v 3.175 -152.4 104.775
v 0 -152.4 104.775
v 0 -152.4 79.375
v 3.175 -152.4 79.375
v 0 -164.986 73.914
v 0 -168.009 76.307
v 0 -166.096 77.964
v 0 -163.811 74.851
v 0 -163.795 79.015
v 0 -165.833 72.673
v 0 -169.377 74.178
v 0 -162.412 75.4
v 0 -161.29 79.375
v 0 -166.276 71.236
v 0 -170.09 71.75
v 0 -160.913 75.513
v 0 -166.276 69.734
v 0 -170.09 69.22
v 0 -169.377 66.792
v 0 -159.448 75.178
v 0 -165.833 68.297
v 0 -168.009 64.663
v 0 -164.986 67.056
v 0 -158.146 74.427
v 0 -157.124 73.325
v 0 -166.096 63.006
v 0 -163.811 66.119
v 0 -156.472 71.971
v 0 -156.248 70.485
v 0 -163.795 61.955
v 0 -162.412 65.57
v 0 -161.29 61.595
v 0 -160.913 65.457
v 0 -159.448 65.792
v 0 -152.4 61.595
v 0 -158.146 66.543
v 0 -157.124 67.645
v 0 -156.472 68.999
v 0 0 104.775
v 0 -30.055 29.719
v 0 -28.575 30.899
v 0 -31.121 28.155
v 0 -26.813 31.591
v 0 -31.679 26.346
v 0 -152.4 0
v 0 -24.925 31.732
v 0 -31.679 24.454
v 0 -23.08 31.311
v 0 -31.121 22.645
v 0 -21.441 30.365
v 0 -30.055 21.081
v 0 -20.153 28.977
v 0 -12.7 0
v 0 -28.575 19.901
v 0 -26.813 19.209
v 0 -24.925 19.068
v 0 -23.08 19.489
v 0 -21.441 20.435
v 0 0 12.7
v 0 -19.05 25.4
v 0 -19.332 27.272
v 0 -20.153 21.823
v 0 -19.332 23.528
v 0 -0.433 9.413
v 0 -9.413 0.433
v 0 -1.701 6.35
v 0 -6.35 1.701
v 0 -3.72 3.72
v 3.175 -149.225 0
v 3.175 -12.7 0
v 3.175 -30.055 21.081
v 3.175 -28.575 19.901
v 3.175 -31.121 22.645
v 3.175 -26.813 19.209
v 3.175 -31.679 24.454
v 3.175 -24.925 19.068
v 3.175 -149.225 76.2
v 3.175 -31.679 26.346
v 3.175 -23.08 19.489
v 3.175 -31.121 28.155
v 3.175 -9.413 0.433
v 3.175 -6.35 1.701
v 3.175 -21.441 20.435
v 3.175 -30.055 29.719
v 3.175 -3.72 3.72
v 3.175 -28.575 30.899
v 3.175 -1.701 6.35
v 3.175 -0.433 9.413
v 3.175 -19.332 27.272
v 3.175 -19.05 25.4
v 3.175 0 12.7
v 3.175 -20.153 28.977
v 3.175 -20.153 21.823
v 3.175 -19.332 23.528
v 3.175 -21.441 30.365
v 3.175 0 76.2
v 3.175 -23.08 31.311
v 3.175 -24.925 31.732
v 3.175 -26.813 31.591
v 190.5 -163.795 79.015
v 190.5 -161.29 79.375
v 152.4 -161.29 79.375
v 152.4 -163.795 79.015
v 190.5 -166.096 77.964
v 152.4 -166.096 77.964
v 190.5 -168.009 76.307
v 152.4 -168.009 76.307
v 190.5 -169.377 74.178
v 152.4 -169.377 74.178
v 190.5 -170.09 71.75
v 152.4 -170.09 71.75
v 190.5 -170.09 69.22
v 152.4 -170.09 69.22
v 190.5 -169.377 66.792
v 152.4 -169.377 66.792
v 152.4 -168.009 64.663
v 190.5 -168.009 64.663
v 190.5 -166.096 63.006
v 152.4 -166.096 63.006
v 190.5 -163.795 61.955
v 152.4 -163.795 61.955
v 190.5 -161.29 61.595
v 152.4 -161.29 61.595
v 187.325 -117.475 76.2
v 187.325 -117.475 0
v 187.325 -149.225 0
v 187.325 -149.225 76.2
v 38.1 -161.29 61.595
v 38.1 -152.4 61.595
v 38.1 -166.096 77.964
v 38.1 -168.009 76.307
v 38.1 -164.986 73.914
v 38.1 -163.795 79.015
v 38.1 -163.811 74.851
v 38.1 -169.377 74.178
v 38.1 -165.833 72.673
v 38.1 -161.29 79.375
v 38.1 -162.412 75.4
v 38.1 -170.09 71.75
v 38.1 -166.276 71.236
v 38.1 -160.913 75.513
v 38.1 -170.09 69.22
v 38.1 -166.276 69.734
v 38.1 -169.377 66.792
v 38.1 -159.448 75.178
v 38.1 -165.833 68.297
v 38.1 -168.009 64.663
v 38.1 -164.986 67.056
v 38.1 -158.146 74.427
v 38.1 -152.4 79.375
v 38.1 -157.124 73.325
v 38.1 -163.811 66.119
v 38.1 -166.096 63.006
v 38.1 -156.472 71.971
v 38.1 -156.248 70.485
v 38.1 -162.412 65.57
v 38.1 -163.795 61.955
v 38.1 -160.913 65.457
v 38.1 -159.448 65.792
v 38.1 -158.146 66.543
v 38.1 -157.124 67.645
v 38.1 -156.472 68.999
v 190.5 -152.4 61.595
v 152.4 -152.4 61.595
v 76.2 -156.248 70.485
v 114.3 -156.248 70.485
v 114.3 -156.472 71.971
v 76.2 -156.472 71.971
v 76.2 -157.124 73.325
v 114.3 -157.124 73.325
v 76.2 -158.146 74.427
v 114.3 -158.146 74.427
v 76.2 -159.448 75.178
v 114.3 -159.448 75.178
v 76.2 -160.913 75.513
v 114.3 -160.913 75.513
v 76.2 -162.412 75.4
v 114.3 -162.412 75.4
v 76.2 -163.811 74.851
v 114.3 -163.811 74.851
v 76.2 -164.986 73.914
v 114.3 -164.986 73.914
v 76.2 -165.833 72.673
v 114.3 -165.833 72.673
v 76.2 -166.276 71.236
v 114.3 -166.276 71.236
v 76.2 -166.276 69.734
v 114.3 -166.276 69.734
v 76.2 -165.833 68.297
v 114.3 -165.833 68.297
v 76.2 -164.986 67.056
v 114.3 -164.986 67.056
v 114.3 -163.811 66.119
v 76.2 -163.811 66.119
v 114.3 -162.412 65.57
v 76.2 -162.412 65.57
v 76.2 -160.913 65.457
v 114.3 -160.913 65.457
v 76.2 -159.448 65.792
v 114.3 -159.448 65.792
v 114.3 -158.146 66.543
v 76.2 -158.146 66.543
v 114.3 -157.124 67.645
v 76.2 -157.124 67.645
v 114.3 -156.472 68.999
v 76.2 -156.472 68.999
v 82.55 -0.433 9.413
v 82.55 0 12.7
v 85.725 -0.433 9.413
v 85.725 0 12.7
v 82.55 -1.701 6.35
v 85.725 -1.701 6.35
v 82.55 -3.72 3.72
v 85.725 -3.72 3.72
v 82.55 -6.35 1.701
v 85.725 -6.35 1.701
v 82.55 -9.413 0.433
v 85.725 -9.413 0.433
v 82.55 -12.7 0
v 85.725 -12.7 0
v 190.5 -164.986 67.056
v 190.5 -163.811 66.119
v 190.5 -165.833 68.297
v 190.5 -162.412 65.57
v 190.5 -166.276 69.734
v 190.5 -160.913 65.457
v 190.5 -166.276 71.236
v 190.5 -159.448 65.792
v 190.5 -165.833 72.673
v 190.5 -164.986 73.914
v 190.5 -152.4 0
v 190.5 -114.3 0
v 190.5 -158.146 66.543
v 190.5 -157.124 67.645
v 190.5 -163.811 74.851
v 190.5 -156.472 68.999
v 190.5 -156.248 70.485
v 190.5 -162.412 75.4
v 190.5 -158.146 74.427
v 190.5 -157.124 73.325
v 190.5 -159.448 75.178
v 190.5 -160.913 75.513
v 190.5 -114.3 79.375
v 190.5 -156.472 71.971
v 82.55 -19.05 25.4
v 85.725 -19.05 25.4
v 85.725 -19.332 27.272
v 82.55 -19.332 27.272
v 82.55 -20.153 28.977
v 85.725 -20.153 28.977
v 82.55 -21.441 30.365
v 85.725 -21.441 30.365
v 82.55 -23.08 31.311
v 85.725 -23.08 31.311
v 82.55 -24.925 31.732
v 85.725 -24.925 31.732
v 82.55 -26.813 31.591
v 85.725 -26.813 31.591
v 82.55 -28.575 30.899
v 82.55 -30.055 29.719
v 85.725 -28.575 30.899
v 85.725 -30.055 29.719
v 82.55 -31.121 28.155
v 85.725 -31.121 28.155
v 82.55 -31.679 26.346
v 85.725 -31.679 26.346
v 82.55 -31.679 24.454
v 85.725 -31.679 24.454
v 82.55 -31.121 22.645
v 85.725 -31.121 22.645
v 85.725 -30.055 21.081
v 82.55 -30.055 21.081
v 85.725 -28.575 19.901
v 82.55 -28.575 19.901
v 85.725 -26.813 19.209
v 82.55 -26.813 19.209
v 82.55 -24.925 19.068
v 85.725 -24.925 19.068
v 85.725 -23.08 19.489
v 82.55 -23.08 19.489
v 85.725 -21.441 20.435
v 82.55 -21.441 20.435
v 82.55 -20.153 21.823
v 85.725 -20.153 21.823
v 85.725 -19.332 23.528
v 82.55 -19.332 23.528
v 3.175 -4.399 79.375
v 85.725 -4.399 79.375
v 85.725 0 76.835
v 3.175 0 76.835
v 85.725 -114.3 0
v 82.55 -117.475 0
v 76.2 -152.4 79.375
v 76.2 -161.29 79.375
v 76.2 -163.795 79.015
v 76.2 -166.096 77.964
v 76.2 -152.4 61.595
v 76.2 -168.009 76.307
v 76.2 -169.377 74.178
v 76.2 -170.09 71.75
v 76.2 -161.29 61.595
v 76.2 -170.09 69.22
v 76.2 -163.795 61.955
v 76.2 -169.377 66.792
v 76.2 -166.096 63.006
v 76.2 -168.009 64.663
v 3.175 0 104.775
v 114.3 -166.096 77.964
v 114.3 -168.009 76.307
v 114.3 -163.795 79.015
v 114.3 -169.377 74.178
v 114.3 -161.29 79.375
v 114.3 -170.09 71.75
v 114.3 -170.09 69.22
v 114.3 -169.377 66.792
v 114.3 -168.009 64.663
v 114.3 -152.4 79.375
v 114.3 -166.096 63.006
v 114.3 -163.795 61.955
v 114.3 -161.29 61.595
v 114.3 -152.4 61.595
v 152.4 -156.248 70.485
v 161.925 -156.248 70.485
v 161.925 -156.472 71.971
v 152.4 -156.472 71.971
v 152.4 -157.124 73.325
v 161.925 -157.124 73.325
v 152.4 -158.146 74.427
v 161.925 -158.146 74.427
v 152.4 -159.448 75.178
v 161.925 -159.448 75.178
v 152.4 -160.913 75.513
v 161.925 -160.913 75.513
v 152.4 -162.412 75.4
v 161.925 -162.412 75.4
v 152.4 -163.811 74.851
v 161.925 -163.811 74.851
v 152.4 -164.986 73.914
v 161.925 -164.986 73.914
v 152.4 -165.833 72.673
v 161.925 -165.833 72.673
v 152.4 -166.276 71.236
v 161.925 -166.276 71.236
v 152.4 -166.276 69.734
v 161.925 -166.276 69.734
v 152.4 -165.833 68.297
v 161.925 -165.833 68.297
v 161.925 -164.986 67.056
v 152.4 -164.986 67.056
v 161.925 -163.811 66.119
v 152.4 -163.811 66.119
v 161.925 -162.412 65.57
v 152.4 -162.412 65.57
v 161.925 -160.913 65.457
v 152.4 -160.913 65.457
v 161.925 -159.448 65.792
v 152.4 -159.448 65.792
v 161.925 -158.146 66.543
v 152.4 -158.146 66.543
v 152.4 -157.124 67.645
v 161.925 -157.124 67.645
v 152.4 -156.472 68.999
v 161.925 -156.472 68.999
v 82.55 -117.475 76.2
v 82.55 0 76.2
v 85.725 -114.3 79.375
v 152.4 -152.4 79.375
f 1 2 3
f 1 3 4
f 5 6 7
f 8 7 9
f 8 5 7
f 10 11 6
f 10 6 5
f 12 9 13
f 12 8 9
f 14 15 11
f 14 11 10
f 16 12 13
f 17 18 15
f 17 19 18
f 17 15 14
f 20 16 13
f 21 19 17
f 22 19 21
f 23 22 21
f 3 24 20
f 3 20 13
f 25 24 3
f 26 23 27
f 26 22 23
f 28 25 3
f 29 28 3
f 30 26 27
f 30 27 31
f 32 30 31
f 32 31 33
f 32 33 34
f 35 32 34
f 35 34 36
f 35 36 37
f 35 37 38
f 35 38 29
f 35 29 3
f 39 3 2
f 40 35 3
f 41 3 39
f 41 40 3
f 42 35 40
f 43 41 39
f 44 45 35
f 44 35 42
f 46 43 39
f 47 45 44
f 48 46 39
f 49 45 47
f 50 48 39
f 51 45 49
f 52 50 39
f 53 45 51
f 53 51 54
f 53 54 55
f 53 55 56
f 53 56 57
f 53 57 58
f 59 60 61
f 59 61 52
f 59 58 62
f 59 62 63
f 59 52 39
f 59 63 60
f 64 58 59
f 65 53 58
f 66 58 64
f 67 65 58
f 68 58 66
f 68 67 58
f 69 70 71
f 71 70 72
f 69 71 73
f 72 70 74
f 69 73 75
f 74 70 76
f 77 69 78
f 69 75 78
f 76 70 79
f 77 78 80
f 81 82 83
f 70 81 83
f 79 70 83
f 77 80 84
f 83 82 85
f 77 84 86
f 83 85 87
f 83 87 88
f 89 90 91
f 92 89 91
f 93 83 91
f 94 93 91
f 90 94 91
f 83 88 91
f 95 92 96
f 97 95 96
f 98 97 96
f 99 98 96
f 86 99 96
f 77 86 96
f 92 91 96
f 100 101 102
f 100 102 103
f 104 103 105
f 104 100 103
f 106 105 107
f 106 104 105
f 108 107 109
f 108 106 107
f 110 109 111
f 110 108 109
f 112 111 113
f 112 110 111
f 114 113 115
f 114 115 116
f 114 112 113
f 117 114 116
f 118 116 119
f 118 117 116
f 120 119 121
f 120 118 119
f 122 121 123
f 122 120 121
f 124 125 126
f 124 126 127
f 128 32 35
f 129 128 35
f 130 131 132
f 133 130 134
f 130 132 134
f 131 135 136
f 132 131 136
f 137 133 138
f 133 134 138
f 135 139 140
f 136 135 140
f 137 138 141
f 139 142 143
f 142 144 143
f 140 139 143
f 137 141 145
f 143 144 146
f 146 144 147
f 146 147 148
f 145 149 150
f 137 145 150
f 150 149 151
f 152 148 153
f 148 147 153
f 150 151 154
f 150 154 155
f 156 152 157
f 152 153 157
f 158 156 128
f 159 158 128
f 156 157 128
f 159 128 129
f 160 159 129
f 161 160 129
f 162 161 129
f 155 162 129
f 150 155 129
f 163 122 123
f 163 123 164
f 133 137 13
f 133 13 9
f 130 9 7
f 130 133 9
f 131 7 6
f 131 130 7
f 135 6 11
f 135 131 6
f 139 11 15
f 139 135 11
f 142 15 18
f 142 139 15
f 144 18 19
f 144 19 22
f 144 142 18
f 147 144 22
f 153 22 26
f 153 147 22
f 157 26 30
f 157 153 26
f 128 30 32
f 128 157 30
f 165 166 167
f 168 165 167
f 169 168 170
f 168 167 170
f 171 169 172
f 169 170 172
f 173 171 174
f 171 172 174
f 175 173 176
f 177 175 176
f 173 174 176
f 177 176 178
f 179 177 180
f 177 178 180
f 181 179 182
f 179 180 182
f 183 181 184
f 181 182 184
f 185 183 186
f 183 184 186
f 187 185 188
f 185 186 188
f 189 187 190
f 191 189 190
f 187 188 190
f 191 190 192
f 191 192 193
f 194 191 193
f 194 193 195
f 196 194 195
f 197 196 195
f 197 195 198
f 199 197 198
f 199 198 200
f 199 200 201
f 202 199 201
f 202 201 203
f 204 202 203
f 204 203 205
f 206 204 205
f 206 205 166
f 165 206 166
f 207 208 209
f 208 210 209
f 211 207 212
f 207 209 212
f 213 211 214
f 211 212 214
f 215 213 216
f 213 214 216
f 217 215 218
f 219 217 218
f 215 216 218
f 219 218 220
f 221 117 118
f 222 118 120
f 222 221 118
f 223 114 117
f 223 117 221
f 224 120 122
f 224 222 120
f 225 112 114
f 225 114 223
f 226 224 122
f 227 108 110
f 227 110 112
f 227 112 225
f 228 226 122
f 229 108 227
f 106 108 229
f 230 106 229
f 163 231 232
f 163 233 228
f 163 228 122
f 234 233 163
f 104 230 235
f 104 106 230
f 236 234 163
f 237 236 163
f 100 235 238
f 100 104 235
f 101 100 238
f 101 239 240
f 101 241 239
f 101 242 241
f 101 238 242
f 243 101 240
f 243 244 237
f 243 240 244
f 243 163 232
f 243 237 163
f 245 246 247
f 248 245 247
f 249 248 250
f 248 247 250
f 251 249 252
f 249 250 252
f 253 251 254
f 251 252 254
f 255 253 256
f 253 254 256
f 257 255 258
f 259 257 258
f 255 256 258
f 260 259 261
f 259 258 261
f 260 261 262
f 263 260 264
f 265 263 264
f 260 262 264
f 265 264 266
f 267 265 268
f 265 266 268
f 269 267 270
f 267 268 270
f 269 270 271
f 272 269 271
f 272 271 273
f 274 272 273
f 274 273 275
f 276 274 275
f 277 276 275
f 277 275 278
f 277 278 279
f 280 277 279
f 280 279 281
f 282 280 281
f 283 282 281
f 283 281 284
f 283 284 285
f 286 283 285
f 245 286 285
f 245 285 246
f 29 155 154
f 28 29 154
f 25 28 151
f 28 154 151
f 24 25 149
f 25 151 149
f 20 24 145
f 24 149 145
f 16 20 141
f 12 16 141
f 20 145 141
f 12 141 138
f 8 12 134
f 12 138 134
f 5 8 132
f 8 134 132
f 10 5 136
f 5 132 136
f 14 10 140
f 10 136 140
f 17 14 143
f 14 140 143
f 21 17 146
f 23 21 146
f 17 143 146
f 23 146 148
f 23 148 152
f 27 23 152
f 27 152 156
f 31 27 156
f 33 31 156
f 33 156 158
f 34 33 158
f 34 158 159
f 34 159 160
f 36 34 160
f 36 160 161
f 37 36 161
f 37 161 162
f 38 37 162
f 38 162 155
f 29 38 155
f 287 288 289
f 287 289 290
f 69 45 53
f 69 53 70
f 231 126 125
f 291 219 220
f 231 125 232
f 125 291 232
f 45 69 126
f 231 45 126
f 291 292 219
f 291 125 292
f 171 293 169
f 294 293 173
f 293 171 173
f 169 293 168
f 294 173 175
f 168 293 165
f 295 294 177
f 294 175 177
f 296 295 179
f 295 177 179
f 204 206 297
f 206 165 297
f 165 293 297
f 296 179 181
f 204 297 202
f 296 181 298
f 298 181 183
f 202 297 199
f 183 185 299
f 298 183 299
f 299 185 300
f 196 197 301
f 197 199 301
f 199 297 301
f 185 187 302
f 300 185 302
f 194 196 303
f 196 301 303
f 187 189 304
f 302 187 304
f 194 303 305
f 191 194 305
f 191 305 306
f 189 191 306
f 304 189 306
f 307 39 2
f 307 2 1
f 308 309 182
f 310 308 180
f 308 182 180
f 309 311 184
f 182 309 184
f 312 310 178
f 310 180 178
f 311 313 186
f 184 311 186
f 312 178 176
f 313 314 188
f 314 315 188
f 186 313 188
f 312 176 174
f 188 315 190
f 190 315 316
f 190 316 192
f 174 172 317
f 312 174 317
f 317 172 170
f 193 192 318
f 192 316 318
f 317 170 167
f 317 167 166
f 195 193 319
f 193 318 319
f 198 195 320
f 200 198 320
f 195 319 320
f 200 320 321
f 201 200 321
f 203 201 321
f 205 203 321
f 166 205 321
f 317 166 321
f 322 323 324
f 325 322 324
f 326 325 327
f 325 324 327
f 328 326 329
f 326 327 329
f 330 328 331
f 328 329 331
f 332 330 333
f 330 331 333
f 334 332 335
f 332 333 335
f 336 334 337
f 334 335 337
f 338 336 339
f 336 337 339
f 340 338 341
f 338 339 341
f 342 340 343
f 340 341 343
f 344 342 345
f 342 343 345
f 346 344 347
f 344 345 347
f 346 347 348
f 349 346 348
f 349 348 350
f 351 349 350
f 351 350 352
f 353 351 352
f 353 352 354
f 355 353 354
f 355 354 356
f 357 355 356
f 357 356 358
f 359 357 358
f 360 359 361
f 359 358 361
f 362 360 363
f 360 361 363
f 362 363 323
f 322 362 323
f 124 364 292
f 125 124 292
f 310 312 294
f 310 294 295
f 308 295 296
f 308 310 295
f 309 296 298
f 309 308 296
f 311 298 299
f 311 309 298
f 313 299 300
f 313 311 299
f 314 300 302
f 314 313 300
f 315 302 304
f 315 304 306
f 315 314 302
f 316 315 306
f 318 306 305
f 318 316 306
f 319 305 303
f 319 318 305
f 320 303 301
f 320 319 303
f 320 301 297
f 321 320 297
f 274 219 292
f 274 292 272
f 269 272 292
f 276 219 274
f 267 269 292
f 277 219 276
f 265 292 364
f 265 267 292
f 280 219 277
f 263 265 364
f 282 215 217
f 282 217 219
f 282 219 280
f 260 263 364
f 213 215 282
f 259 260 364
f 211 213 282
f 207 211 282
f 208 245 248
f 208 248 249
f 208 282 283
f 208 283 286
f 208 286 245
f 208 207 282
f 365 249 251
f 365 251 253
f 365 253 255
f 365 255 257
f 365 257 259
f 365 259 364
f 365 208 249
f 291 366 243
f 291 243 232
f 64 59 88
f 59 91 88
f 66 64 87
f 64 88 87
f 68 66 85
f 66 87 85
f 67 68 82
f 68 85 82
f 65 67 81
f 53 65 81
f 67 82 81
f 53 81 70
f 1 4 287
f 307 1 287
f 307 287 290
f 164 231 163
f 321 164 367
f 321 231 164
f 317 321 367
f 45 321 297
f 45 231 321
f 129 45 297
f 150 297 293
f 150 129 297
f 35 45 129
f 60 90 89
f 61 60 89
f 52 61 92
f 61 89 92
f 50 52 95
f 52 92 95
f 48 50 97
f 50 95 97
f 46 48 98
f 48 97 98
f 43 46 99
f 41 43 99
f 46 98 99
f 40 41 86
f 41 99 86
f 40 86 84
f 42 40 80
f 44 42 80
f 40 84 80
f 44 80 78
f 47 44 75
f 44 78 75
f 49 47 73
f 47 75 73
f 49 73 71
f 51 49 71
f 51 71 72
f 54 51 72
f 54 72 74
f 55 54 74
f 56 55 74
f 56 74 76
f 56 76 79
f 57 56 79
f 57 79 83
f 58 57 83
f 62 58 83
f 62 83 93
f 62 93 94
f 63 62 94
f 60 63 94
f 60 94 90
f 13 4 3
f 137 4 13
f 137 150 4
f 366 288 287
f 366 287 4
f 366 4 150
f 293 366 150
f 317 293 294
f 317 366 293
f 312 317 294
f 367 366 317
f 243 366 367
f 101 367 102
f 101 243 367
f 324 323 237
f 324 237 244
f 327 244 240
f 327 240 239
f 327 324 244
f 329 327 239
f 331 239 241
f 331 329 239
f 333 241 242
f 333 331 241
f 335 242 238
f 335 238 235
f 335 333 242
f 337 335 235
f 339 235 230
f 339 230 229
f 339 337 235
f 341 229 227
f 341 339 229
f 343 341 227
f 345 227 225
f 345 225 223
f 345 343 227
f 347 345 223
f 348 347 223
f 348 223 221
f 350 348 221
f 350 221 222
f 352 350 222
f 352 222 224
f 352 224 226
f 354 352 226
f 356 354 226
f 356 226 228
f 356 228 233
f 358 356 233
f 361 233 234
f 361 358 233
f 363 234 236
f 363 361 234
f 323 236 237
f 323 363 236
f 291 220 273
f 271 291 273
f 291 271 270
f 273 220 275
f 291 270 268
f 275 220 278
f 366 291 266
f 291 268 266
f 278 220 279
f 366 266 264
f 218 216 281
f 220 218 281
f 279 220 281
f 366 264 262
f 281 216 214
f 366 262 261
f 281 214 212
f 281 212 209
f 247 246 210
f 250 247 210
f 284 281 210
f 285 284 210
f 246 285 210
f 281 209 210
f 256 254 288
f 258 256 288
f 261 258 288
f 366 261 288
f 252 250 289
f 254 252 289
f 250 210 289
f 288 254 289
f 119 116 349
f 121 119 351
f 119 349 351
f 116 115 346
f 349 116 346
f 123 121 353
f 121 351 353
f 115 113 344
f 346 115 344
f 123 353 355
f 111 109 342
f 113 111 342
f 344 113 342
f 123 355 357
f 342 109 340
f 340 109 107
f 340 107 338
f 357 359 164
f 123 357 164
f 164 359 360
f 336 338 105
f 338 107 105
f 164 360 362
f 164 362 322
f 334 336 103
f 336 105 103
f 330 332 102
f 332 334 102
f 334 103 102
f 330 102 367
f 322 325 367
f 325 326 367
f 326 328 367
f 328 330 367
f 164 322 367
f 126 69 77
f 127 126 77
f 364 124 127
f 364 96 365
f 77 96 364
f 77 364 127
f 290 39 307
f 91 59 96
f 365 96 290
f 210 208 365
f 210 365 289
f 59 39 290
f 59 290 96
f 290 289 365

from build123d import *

# Parameters (mm, degrees)
F0_W      = 3.175
F0_H      = 76.2
F0_H_2    = 3.175
F0_W_2    = 79.375
F1_DEPTH  = 152.4
F2_W      = 3.175
F2_H      = 76.2
F2_H_2    = 3.175
F2_W_2    = 31.75
F3_DEPTH  = 76.2
F4_W      = 3.175
F4_H      = 76.2
F5_DEPTH  = 79.375
F6_W      = 3.175
F6_H      = 76.2
F7_DEPTH  = 31.75
F8_R      = 5.0419
F9_DEPTH  = 161.925
F11_DEPTH = 17.781
F12_DEPTH = 61.596
F13_W     = 3.175
F13_H     = 152.4
F14_DEPTH = 25.4
F15_DEPTH = 25.4
F16_R     = 6.35
F17_DEPTH = 85.726
F18_R     = 12.7
F19_SIZE2 = 4.3994090512
F19_SIZE  = 2.54
F20_DEPTH = 38.1
F21_W     = 3.175
F21_H     = 76.2
F22_DEPTH = 31.75
F23_DEPTH = 28.575
F24_DEPTH = 9.525


with BuildPart() as f1:
    # F0 (on Front) → F1 (new body)
    with BuildSketch(Plane.XZ):
        with Locations((1.5875, 38.1)):
            Rectangle(F0_W, F0_H)
        with Locations((1.5875, 77.7875)):
            Rectangle(F0_W, F0_H_2)
        with Locations((42.8625, 77.7875)):
            Rectangle(F0_W_2, F0_H_2)
        with Locations((84.1375, 77.7875)):
            Rectangle(F0_W, F0_H_2)
        with Locations((84.1375, 38.1)):
            Rectangle(F0_W, F0_H)
    extrude(amount=F1_DEPTH)

    # F2 (on face) → F3 (join)
    with BuildSketch(Plane.YZ.offset(85.725)):
        with Locations((-150.8125, 38.1)):
            Rectangle(F2_W, F2_H)
        with Locations((-150.8125, 77.7875)):
            Rectangle(F2_W, F2_H_2)
        with Locations((-133.35, 77.7875)):
            Rectangle(F2_W_2, F2_H_2)
        with Locations((-115.8875, 38.1)):
            Rectangle(F2_W, F2_H)
        with Locations((-115.8875, 77.7875)):
            Rectangle(F2_W, F2_H_2)
    extrude(amount=F3_DEPTH)

    # F4 (on face) → F5 (join, through all)
    with BuildSketch(Plane.YZ.offset(3.175)):
        with Locations((-150.8125, 38.1)):
            Rectangle(F4_W, F4_H)
    extrude(amount=F5_DEPTH)

    # F6 (on face) → F7 (join, through all)
    with BuildSketch(Plane.XZ.offset(117.475)):
        with Locations((160.3375, 38.1)):
            Rectangle(F6_W, F6_H)
    extrude(amount=F7_DEPTH)

    # F8 (on face) → F9 (join, through all)
    with BuildSketch(Plane.YZ.offset(161.925)):
        with BuildLine():
            Line((-152.4, 79.375), (-161.29, 79.375))
            ThreePointArc((-161.29, 79.375), (-170.18, 70.485), (-161.29, 61.595))
            Line((-161.29, 61.595), (-152.4, 61.595))
            Line((-152.4, 61.595), (-152.4, 79.375))
        make_face()
        with Locations((-161.29, 70.485)):
            Circle(F8_R, mode=Mode.SUBTRACT)
    extrude(amount=-F9_DEPTH)

    # F10 (on face) → F11 (cut, through all)
    with BuildSketch(Plane(origin=(0, 0, 61.595), x_dir=(1, 0, 0), z_dir=(0, 0, -1))):
        Polygon((114.3, 152.4), (152.4, 152.4), (152.4, 171.5404093266), (152.4, 189.2811655998), (114.3, 189.2811655998), (114.3, 183.5609525442), align=None)
        Polygon((152.4, 171.5404093266), (152.4, 152.4), (152.4, 103.7641689181), (174.3682473898, 103.7641689181), (174.3682473898, 171.5404093266), align=None)
        Polygon((38.1, 152.4), (76.2, 152.4), (76.2, 183.5609525442), (76.2, 185.6450736523), (38.1, 185.6450736523), (38.1, 184.6726387739), align=None)
    extrude(amount=-F11_DEPTH, mode=Mode.SUBTRACT)

    # F12 (cut, through all): a face of the model
    f12_faces = [f1.faces().sort_by_distance(p)[0] for p in [
        (159.146875, -133.35, 61.595),
    ]]
    extrude(f12_faces, amount=-F12_DEPTH, mode=Mode.SUBTRACT)

    # F13 (on face) → F14 (join)
    with BuildSketch(Plane.XY.offset(79.375)):
        with Locations((1.5875, -76.2)):
            Rectangle(F13_W, F13_H)
    extrude(amount=F14_DEPTH)

    # F15 (cut): a face of the model
    f15_faces = [f1.faces().sort_by_distance(p)[0] for p in [
        (85.725, -133.35, 38.1),
    ]]
    extrude(f15_faces, amount=-F15_DEPTH, mode=Mode.SUBTRACT)

    # F16 (on face) → F17 (cut, through all)
    with BuildSketch(Plane.YZ.offset(85.725)):
        with Locations((-25.4, 25.4)):
            Circle(F16_R)
    extrude(amount=-F17_DEPTH, mode=Mode.SUBTRACT)

    # F18
    f18_edges = [f1.edges().sort_by_distance(p)[0] for p in [
        (84.1375, 0, 0),
        (1.5875, 0, 0),
    ]]
    fillet(f18_edges, radius=F18_R)

    # F19
    f19_edges = [f1.edges().sort_by_distance(p)[0] for p in [
        (44.45, 0, 79.375),
    ]]
    f19_side = f1.faces().sort_by_distance((1.916963, 0, 44.45))[0]
    chamfer(f19_edges, length=F19_SIZE, length2=F19_SIZE2, reference=f19_side)

    # F20 (add): a face of the model
    f20_faces = [f1.faces().sort_by_distance(p)[0] for p in [
        (152.4, -115.1804544636, 39.6875),
    ]]
    extrude(f20_faces, amount=F20_DEPTH)

    # F21 (on face) → F22 (join, through all)
    with BuildSketch(Plane.XZ.offset(117.475)):
        with Locations((188.9125, 38.1)):
            Rectangle(F21_W, F21_H)
    extrude(amount=F22_DEPTH)

    # F8 (on face) → F23 (join, through all)
    with BuildSketch(Plane.YZ.offset(161.925)):
        with BuildLine():
            Line((-152.4, 79.375), (-161.29, 79.375))
            ThreePointArc((-161.29, 79.375), (-170.18, 70.485), (-161.29, 61.595))
            Line((-161.29, 61.595), (-152.4, 61.595))
            Line((-152.4, 61.595), (-152.4, 79.375))
        make_face()
        with Locations((-161.29, 70.485)):
            Circle(F8_R, mode=Mode.SUBTRACT)
    extrude(amount=F23_DEPTH)

    # F24 (add): a face of the model
    f24_faces = [f1.faces().sort_by_distance(p)[0] for p in [
        (161.925, -156.845, 61.8464471714),
    ]]
    extrude(f24_faces, amount=F24_DEPTH)


solid = f1.part
